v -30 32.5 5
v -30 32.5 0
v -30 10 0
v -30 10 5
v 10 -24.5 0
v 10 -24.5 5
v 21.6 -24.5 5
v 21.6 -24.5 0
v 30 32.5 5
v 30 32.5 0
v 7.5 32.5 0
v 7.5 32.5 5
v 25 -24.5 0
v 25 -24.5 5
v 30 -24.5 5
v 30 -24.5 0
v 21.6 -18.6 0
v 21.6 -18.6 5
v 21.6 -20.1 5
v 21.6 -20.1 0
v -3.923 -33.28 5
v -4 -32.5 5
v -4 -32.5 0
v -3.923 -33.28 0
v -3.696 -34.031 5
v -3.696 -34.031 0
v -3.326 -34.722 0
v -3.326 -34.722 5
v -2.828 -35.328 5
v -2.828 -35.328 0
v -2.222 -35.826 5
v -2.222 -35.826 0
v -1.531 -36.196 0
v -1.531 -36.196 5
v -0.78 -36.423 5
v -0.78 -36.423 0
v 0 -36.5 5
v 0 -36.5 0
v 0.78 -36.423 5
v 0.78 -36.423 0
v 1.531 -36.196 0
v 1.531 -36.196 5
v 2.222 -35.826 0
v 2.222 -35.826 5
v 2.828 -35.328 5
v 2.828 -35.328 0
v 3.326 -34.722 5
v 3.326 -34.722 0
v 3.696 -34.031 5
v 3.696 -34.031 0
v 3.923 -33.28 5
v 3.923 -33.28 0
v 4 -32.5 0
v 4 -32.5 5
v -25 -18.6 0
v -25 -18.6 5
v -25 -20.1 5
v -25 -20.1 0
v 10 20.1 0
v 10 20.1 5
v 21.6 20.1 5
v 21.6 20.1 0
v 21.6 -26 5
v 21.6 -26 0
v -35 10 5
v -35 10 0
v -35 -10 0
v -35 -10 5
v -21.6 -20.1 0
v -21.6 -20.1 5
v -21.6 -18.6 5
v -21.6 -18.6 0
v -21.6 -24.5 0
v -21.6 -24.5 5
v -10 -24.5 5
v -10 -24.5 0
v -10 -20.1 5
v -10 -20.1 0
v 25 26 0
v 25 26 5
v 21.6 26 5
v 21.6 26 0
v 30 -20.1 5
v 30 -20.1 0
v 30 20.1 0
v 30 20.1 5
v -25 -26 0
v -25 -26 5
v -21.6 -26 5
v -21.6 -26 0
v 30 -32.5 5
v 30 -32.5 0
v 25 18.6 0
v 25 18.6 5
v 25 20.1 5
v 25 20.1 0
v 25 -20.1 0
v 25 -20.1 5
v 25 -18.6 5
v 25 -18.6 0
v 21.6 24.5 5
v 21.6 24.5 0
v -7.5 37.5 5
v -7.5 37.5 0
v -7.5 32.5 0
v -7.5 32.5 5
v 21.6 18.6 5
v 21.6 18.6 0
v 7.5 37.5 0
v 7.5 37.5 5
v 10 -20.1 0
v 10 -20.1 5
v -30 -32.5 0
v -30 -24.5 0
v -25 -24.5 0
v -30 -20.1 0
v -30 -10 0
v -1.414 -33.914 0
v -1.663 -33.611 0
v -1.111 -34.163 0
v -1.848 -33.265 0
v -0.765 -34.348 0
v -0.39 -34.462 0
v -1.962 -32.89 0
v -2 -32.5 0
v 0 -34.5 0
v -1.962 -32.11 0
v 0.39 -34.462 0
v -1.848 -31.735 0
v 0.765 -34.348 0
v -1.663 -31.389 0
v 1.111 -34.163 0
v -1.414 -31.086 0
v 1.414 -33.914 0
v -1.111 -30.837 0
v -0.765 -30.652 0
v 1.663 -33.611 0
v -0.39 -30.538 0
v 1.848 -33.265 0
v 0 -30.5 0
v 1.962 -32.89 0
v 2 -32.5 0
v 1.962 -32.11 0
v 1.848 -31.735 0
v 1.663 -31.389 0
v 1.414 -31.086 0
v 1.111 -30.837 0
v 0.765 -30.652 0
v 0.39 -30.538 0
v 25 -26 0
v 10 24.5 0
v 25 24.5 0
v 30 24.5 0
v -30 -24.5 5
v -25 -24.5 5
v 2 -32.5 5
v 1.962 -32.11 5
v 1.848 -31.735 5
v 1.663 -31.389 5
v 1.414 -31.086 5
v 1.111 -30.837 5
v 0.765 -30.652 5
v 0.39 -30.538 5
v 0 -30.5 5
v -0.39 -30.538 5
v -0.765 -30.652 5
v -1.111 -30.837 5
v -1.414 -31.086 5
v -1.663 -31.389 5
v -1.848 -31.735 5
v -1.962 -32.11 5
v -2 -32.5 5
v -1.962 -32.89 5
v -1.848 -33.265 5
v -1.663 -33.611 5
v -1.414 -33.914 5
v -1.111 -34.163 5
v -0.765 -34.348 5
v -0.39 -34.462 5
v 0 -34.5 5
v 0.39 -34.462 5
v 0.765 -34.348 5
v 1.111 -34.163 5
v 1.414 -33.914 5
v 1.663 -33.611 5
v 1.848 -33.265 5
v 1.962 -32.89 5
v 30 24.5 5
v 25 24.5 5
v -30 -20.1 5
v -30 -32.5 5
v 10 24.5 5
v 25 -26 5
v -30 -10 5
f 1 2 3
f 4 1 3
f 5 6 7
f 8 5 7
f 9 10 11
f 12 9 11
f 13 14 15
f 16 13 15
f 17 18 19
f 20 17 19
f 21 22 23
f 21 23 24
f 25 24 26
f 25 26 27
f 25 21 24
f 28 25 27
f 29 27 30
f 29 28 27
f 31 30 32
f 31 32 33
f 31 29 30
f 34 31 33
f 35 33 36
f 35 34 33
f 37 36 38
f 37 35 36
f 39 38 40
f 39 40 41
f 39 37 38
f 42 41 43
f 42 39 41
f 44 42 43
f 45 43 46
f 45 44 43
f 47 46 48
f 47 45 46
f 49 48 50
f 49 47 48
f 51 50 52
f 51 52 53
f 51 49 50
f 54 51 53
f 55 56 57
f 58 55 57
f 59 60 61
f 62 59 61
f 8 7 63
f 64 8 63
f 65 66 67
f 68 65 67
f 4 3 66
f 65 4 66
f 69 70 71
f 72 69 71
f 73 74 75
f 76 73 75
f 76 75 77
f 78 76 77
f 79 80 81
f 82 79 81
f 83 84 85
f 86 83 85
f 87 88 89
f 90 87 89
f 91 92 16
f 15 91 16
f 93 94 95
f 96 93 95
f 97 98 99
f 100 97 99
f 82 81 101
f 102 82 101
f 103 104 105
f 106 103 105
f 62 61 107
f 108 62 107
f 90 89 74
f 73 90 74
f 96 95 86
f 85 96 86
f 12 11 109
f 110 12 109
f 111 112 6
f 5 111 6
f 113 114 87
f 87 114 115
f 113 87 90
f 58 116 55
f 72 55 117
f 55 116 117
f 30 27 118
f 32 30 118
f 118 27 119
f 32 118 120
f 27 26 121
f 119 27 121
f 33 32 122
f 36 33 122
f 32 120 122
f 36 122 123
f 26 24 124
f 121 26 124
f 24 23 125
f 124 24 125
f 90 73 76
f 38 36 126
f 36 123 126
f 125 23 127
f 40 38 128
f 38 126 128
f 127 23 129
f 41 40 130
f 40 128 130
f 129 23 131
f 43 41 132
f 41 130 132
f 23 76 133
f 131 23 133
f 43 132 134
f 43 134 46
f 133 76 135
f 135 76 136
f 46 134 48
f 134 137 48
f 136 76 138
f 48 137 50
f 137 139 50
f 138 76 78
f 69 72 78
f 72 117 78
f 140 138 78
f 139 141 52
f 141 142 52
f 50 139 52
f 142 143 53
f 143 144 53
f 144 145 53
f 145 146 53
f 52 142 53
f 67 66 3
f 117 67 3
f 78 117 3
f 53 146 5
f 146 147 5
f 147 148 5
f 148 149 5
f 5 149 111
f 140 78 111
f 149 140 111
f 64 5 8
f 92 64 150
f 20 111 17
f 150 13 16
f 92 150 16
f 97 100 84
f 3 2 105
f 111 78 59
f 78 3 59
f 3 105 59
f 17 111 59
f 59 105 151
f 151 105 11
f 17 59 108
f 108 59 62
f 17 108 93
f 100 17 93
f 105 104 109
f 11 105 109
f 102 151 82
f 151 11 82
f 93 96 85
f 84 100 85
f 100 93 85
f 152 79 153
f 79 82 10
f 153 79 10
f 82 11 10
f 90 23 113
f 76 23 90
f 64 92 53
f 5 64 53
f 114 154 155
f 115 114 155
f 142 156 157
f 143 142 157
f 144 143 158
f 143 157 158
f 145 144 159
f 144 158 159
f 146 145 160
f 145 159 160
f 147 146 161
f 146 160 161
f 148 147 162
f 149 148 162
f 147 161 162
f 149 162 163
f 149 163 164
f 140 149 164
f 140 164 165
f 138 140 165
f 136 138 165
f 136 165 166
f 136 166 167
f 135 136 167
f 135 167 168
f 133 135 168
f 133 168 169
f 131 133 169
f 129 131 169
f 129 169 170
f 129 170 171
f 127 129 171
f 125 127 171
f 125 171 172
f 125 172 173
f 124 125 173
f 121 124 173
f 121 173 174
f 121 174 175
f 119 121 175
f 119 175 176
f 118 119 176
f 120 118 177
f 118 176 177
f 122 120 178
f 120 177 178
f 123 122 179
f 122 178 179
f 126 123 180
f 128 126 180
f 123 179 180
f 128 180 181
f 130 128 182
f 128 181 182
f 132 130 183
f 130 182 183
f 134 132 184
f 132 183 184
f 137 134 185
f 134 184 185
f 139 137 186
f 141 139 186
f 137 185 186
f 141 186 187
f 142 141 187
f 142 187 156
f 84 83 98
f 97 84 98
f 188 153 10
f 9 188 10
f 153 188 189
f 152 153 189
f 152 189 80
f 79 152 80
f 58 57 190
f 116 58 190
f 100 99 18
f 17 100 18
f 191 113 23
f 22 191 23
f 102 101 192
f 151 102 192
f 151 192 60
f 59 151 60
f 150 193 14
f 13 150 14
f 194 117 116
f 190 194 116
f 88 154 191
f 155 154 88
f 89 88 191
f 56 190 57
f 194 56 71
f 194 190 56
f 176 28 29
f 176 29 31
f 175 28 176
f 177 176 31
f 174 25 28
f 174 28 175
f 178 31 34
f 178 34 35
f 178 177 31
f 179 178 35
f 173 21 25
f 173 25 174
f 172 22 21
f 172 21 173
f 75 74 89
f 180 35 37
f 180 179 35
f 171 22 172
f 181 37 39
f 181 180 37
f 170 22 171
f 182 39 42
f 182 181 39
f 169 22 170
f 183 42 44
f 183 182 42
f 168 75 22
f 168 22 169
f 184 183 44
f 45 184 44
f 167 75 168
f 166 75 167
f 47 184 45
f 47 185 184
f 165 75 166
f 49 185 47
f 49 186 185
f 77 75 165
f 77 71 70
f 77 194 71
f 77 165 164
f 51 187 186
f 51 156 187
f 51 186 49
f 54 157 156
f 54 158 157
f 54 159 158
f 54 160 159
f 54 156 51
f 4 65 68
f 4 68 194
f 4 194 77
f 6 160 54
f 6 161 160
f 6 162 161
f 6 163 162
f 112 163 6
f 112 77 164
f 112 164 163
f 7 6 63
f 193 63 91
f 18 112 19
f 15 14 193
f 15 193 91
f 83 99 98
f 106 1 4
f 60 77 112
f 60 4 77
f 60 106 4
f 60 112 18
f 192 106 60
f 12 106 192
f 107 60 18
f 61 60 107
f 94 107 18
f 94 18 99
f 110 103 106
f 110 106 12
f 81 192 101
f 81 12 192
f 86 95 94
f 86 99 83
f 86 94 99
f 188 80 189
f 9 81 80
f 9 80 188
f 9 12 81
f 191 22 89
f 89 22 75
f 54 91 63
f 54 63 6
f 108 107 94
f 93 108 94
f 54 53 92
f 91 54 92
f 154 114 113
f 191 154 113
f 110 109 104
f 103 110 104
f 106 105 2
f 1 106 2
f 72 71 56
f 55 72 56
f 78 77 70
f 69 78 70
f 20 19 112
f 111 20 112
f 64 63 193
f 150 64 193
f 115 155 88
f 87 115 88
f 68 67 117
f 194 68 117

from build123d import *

# Parameters (mm, degrees)
BOSS_EXTRUDE1_DEPTH = 5
CUT_EXTRUDE1_DEPTH  = 5
SKETCH10_R          = 4
SKETCH10_R_2        = 2
BOSS_EXTRUDE3_DEPTH = 5
SKETCH11_R          = 2
CUT_EXTRUDE3_DEPTH  = 5


with BuildPart() as part:
    # Sketch1 → Boss-Extrude1 (new body)
    with BuildSketch(Plane.XY):
        Polygon((7.5, 32.5), (7.5, 37.5), (-7.5, 37.5), (-7.5, 32.5), (-30, 32.5), (-30, 10), (-35, 10), (-35, -10), (-30, -10), (-30, -32.5), (30, -32.5), (30, 32.5), align=None)
    extrude(amount=BOSS_EXTRUDE1_DEPTH)

    # Sketch3 → Cut-Extrude1 (cut)
    with BuildSketch(Plane.XY.offset(5)):
        Polygon((30, 24.5), (25, 24.5), (25, 26), (21.6, 26), (21.6, 24.5), (10, 24.5), (10, 20.1), (21.6, 20.1), (21.6, 18.6), (25, 18.6), (25, 20.1), (30, 20.1), align=None)
        Polygon((30, -24.5), (30, -20.1), (25, -20.1), (25, -18.6), (21.6, -18.6), (21.6, -20.1), (10, -20.1), (10, -24.5), (21.6, -24.5), (21.6, -26), (25, -26), (25, -24.5), align=None)
        Polygon((-30, -24.5), (-25, -24.5), (-25, -26), (-21.6, -26), (-21.6, -24.5), (-10, -24.5), (-10, -20.1), (-21.6, -20.1), (-21.6, -18.6), (-25, -18.6), (-25, -20.1), (-30, -20.1), align=None)
    extrude(amount=-CUT_EXTRUDE1_DEPTH, mode=Mode.SUBTRACT)

    # Sketch10 → Boss-Extrude3 (add)
    with BuildSketch(Plane.XY.offset(5)):
        with Locations((0, -32.5)):
            Circle(SKETCH10_R)
        with Locations((0, -32.5)):
            Circle(SKETCH10_R_2, mode=Mode.SUBTRACT)
    extrude(amount=-BOSS_EXTRUDE3_DEPTH)

    # Sketch11 → Cut-Extrude3 (cut)
    with BuildSketch(Plane.XY.offset(5)):
        with Locations((0, -32.5)):
            Circle(SKETCH11_R)
    extrude(amount=-CUT_EXTRUDE3_DEPTH, mode=Mode.SUBTRACT)


solid = part.part
